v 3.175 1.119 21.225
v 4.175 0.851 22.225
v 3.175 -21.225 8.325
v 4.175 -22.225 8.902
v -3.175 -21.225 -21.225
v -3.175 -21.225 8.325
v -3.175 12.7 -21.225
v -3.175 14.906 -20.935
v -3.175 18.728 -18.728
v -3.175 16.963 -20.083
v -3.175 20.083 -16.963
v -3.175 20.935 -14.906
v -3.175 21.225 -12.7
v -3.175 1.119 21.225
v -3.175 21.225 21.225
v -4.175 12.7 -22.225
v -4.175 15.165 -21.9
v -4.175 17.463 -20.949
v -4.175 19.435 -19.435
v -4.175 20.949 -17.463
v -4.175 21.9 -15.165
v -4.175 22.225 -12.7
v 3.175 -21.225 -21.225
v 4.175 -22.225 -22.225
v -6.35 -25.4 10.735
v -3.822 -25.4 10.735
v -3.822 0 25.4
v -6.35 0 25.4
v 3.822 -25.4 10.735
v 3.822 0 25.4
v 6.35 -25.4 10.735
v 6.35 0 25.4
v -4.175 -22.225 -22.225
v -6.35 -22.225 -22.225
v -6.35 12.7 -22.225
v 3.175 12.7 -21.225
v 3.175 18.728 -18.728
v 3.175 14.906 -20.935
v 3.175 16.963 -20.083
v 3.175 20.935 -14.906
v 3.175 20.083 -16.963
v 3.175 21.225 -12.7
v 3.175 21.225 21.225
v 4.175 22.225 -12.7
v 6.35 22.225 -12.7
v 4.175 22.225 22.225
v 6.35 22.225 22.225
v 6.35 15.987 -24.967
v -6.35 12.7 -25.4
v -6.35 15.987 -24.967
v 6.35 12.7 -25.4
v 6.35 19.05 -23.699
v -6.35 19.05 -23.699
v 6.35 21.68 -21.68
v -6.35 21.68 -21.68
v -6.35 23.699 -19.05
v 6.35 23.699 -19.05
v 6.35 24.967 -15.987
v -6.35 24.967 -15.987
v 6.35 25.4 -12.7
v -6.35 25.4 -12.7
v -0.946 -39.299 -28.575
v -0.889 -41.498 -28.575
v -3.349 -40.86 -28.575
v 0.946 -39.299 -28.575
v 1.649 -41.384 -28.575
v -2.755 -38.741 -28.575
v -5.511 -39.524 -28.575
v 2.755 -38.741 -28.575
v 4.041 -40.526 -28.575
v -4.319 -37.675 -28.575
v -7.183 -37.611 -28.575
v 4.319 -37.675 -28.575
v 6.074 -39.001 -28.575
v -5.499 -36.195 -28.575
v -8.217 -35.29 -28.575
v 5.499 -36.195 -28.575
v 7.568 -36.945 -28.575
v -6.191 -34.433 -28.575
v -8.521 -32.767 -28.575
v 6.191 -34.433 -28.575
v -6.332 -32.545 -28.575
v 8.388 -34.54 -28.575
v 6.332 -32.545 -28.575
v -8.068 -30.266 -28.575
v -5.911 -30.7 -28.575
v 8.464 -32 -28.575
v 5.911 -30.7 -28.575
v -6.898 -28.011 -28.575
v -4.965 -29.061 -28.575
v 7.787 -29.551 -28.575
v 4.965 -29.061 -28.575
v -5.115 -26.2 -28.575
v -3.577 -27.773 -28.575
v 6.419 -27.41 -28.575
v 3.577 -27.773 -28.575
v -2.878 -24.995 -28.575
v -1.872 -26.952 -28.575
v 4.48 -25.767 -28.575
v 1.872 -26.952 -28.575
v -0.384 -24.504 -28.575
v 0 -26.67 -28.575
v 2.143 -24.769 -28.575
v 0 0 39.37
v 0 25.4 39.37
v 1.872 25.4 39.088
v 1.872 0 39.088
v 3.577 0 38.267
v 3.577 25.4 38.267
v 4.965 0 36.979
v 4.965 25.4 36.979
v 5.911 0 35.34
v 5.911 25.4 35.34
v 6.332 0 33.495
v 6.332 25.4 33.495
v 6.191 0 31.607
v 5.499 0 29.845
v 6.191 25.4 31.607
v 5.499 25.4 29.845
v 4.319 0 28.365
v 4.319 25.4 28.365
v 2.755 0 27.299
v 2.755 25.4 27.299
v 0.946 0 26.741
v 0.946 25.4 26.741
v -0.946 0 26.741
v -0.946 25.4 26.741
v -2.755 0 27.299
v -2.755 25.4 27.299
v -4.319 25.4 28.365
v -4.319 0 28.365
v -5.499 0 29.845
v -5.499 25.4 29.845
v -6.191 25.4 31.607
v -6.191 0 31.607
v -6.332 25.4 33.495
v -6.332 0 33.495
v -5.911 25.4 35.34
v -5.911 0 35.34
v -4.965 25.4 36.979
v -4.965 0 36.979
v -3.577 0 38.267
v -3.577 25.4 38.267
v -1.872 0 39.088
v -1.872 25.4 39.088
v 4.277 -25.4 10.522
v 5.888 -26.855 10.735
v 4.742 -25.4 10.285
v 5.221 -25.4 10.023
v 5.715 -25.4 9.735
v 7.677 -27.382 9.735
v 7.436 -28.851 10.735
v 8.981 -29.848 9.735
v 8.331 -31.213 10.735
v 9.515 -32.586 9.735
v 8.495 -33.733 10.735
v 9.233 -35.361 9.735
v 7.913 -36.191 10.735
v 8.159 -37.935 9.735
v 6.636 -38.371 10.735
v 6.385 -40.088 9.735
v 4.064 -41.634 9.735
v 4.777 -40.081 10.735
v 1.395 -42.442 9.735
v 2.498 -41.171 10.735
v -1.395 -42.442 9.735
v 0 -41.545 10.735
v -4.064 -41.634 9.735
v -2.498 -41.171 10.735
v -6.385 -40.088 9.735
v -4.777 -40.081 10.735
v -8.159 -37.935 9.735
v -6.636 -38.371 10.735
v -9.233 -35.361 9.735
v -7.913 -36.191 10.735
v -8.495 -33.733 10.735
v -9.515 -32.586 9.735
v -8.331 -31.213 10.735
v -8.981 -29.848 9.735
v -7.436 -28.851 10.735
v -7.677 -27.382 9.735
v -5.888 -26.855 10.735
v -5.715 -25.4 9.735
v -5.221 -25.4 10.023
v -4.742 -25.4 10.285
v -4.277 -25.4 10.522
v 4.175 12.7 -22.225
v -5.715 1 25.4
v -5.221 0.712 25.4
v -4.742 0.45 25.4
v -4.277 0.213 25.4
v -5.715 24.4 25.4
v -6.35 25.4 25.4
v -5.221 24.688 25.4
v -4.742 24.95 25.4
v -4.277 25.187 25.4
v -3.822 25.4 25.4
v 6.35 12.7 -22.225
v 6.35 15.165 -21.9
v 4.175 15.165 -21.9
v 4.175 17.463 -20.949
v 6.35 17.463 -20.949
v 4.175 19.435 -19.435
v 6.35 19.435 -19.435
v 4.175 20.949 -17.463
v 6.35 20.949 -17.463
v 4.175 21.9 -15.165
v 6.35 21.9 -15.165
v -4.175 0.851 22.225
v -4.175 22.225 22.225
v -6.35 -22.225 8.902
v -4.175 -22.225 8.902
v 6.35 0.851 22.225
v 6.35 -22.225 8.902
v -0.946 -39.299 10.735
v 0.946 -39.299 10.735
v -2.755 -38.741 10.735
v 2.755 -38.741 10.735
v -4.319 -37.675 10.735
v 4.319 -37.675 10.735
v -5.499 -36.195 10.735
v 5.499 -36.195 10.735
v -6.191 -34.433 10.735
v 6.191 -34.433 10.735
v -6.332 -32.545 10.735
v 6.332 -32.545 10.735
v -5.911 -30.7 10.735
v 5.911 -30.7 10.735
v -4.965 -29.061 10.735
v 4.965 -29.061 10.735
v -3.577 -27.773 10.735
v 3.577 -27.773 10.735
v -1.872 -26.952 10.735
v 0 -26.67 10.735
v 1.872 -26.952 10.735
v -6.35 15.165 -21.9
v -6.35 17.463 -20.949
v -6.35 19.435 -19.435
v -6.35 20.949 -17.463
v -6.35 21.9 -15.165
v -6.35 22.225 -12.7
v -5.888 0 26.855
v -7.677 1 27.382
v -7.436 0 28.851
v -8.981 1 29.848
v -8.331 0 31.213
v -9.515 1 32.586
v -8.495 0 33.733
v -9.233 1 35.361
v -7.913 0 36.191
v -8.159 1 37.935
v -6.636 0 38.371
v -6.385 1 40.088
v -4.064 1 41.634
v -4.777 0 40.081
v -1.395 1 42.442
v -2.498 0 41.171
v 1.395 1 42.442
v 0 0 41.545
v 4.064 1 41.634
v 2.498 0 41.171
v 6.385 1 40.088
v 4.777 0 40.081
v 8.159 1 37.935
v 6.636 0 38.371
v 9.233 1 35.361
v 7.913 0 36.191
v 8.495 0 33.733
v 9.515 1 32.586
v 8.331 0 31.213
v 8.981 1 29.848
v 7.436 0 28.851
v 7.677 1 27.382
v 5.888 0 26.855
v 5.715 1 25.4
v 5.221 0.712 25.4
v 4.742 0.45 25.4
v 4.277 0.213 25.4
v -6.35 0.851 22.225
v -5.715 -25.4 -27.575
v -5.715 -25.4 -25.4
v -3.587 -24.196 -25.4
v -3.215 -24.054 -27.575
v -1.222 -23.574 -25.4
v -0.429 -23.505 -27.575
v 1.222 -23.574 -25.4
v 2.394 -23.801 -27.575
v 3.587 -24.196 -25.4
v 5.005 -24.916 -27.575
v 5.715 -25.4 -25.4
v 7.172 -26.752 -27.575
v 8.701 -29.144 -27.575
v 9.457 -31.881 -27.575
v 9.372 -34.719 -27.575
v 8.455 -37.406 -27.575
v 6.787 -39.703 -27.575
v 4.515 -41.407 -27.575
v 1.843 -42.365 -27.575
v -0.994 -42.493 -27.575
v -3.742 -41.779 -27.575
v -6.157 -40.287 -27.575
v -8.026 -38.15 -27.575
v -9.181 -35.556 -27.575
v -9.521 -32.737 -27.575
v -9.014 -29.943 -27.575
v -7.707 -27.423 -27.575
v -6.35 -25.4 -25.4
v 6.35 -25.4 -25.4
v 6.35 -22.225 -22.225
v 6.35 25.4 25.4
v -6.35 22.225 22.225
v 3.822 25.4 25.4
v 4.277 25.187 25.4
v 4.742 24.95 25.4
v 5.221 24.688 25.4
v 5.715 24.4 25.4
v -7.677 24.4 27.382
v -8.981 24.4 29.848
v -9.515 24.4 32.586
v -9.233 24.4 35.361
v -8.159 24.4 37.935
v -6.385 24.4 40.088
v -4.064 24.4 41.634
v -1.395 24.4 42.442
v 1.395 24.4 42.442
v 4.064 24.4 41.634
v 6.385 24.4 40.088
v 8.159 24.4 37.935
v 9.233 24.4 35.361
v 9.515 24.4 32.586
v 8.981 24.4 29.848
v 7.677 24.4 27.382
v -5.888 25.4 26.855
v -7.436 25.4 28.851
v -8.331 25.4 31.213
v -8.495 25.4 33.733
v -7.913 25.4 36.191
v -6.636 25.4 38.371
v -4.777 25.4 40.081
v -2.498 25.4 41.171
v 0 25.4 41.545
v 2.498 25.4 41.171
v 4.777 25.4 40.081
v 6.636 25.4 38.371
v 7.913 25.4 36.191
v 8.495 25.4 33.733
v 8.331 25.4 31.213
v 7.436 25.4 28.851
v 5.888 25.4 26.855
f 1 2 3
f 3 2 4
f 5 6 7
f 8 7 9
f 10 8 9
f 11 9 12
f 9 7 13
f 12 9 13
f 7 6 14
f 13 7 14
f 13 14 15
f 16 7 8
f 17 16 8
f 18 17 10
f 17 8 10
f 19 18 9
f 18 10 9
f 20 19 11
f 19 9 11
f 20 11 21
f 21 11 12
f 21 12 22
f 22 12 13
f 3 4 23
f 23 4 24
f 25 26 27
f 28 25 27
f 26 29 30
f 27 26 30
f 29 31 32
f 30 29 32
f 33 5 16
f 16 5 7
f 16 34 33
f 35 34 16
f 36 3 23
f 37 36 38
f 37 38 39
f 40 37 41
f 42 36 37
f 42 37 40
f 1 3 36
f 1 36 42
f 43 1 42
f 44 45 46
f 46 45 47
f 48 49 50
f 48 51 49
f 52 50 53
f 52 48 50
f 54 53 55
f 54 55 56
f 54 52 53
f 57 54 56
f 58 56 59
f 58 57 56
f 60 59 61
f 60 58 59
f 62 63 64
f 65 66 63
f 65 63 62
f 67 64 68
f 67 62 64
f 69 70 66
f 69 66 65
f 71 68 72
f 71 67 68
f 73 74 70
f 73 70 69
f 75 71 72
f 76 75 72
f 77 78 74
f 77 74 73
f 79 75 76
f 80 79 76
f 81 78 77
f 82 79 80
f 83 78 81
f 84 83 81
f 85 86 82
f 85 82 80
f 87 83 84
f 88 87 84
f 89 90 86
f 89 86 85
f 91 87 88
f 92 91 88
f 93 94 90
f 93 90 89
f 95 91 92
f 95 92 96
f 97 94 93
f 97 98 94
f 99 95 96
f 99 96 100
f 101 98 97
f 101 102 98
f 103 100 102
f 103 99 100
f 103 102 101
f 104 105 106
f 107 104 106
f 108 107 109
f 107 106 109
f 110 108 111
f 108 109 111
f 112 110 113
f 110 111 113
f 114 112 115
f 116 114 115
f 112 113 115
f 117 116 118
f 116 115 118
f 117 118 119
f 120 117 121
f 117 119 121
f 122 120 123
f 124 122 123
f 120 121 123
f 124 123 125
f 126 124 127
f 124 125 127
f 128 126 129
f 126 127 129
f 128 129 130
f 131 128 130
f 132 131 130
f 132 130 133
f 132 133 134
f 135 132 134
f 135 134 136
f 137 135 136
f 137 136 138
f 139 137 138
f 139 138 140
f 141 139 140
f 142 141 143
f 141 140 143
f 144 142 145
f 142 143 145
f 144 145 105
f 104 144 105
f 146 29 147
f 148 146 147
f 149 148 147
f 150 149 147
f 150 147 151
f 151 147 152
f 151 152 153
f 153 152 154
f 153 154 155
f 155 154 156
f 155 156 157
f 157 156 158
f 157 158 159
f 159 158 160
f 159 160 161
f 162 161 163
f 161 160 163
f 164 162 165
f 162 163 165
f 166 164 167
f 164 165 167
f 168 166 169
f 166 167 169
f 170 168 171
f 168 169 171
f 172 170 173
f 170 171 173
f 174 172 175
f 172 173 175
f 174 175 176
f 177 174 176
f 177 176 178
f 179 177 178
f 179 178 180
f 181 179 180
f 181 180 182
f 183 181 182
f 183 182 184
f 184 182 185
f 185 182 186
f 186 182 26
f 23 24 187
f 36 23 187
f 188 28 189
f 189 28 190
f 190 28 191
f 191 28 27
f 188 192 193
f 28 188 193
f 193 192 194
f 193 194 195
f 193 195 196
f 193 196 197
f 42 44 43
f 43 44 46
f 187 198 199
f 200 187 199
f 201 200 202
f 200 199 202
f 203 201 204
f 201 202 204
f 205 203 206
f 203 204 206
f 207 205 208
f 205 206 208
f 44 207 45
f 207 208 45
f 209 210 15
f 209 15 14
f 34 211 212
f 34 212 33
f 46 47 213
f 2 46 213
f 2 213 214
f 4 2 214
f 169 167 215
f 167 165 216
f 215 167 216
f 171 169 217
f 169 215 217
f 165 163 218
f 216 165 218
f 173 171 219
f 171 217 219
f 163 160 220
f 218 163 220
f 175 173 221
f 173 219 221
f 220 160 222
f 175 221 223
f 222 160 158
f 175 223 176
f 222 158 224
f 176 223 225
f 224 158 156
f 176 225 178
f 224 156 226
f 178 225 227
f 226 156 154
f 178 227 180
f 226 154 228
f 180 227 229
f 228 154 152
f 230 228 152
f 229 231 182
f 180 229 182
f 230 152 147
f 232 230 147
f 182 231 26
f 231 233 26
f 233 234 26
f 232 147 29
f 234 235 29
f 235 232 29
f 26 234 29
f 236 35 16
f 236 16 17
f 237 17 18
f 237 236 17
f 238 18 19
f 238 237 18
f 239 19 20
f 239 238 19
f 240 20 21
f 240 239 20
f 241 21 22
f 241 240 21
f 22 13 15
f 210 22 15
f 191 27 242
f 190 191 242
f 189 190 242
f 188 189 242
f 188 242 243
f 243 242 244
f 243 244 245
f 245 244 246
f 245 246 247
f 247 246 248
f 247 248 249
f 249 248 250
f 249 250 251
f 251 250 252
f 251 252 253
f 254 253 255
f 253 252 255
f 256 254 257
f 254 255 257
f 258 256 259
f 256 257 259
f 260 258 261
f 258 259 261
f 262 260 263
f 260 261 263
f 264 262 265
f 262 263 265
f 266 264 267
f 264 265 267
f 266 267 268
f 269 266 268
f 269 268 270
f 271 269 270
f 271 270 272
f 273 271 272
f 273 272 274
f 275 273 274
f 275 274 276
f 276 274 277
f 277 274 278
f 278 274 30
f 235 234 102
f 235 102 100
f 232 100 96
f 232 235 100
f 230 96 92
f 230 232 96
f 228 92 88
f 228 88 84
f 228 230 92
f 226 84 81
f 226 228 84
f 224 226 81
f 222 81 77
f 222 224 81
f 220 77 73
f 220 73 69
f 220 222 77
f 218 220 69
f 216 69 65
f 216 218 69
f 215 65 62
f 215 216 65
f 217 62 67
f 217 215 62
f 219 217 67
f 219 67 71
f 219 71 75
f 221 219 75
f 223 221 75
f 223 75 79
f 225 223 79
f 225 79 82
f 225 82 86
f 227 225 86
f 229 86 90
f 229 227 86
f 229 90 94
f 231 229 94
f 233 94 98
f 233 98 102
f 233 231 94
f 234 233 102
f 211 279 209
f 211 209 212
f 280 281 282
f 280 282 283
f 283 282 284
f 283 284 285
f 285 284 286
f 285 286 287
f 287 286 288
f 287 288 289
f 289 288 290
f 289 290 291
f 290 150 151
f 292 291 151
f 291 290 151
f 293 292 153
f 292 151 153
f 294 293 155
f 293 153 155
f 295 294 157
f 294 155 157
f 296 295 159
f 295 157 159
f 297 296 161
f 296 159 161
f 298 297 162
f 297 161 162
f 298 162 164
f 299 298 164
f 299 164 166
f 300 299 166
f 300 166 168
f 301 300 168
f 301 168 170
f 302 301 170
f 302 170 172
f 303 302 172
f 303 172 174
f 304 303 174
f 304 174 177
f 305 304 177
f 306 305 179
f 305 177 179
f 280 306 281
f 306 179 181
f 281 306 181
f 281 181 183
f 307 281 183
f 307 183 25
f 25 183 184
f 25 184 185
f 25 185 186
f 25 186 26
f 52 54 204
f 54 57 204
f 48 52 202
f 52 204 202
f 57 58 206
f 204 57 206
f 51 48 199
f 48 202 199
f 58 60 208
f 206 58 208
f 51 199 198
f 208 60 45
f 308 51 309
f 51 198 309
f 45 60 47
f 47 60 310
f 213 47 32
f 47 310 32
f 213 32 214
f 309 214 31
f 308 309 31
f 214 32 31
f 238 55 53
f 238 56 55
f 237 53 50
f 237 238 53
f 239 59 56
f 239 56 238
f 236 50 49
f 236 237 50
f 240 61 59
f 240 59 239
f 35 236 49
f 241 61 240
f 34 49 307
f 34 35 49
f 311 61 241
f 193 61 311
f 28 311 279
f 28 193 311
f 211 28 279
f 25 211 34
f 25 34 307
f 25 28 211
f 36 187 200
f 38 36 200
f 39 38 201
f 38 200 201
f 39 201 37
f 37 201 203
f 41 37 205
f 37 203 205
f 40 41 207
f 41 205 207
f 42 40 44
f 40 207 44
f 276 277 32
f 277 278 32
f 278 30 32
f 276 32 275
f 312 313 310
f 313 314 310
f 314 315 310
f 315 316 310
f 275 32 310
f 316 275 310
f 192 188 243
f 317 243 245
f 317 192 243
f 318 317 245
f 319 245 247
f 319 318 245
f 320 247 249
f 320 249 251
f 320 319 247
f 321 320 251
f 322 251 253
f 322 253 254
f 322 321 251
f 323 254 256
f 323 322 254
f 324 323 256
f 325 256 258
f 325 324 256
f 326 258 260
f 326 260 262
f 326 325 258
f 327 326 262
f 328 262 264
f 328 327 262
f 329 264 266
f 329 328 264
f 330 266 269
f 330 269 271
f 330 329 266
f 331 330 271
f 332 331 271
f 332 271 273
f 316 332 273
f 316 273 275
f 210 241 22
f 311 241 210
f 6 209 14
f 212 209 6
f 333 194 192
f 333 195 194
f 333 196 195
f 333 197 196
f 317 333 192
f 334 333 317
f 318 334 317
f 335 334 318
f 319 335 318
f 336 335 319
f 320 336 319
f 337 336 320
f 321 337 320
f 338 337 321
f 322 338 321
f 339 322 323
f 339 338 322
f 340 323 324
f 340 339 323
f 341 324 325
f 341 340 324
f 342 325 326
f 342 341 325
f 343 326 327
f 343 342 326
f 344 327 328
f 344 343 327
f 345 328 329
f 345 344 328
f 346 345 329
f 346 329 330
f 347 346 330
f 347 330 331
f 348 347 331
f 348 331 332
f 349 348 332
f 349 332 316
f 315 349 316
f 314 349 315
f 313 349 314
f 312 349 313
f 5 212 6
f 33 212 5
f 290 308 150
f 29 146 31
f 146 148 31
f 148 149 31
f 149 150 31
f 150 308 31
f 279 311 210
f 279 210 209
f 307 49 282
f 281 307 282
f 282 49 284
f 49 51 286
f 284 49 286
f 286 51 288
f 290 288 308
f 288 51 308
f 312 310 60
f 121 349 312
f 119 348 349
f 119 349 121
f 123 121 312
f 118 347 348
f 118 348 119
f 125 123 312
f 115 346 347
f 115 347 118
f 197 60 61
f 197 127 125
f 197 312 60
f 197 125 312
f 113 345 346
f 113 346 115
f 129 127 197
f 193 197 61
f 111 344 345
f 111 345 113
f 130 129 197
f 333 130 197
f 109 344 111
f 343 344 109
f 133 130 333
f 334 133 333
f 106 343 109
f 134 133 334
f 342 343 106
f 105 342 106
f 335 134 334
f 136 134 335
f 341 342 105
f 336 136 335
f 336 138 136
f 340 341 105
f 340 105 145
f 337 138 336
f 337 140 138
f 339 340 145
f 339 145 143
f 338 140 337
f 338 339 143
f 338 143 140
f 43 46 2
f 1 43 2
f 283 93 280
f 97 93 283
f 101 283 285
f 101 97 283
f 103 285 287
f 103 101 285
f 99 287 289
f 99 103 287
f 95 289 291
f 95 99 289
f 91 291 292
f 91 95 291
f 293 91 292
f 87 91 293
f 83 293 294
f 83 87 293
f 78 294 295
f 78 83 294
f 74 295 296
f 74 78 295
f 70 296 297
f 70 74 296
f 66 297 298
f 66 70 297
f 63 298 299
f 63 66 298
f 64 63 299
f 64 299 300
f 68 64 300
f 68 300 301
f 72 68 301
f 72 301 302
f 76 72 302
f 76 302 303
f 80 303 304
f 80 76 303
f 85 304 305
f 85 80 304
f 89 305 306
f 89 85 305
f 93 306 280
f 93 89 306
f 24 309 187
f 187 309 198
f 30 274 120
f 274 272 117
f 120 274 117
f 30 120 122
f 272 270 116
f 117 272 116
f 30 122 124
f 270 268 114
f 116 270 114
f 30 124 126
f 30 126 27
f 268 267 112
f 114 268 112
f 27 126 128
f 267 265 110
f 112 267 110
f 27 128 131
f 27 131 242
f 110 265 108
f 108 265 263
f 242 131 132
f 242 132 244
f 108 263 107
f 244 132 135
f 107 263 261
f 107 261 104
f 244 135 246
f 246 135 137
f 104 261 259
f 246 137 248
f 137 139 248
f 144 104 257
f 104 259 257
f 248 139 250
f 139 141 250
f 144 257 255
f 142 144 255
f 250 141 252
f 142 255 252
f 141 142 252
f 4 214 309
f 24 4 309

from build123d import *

# Parameters (mm, degrees)
BOSS_EXTRUDE1_DEPTH      = 6.35
FILLET1_R                = 12.7
CUT_EXTRUDE2_DEPTH       = 3.175
BOSS_EXTRUDE2_DEPTH      = 3.175
BOSS_EXTRUDE2_DEPTH_BACK = 36.135303
SKETCH4_R                = 9.525
SKETCH4_R_2              = 6.35
SKETCH5_R                = 9.525
SKETCH5_R_2              = 6.35
BOSS_EXTRUDE3_DEPTH      = 25.4
CHAMFER2_SIZE            = 1
CHAMFER4_SIZE            = 1


with BuildPart() as part:
    # Sketch1 → Boss-Extrude1 (new, symmetric)
    with BuildSketch(Plane.YZ):
        Polygon((-25.4, 10.735303163), (0, 25.4), (25.4, 25.4), (25.4, -25.4), (-25.4, -25.4), align=None)
    extrude(amount=BOSS_EXTRUDE1_DEPTH, both=True)

    # Fillet1
    fillet1_edges = [part.edges().sort_by_distance(p)[0] for p in [
        (0, 25.4, -25.4),
    ]]
    fillet(fillet1_edges, radius=FILLET1_R)

    # Sketch3 → Cut-Extrude2 (cut)
    with BuildSketch(Plane.YZ.offset(6.35)):
        with BuildLine():
            Line((-22.225, -22.225), (12.7, -22.225))
            ThreePointArc((12.7, -22.225), (19.435192091, -19.435192091), (22.225, -12.7))
            Line((22.225, -12.7), (22.225, 22.225))
            Line((22.225, 22.225), (0.850738686, 22.225))
            Line((0.850738686, 22.225), (-22.225, 8.902216058))
            Line((-22.225, 8.902216058), (-22.225, -22.225))
        make_face()
    cut_extrude2 = extrude(amount=-CUT_EXTRUDE2_DEPTH, mode=Mode.SUBTRACT)

    # Mirror1: Cut-Extrude2 across plane
    add(cut_extrude2.mirror(Plane(origin=(0, 0, 0), x_dir=(0, 0, 1), z_dir=(1, 0, 0))), mode=Mode.SUBTRACT)

    # Sketch4 → Boss-Extrude2 (add, two sides: drawn at the far end of the back side and taken through both)
    with BuildSketch(Plane(origin=(0, 0, -25.4), x_dir=(1, 0, 0), z_dir=(0, 0, -1)).offset(-BOSS_EXTRUDE2_DEPTH_BACK)):
        with Locations(Location((0, 33.02, 0), (0, 0, 233.130102354))):
            Circle(SKETCH4_R)
        with Locations(Location((0, 33.02, 0), (0, 0, 270))):
            Circle(SKETCH4_R_2, mode=Mode.SUBTRACT)
    extrude(amount=BOSS_EXTRUDE2_DEPTH + BOSS_EXTRUDE2_DEPTH_BACK)

    # Sketch5 → Boss-Extrude3 (add)
    with BuildSketch(Plane(origin=(0, 25.4, 0), x_dir=(-1, 0, 0), z_dir=(0, 1, 0))):
        with Locations((0, 33.02)):
            Circle(SKETCH5_R)
        with Locations(Location((0, 33.02, 0), (0, 0, 90))):
            Circle(SKETCH5_R_2, mode=Mode.SUBTRACT)
    extrude(amount=-BOSS_EXTRUDE3_DEPTH)

    # Chamfer2
    # the kernel refuses this chamfer: 1 mm, written as the material it takes off along each edge
    with BuildSketch(Plane(origin=(0, -33.02, 10.735303), x_dir=(0.3638595085405839, 0.931453841070294, 0), z_dir=(-0.931453841070294, 0.3638595085405839, 0))) as chamfer2_piece_1_section:
        Polygon((9.525, CHAMFER2_SIZE), (9.525 - CHAMFER2_SIZE, 0), (9.525, 0), align=None)
    chamfer2_piece_1 = revolve(axis=Axis((0, -33.02, 10.735303), (0, 0, -1)), revolution_arc=317.325176487, mode=Mode.PRIVATE)
    chamfer2_piece_1 = split(chamfer2_piece_1, bisect_by=Plane(origin=(5.777045626, -25.4, 10.24862198), z_dir=(0, -1, 0)), keep=Keep.TOP, mode=Mode.PRIVATE)
    add(chamfer2_piece_1, mode=Mode.SUBTRACT)
    with BuildSketch(Plane(origin=(0, -33.02, -28.575), x_dir=(-0.6000000000021781, 0.7999999999983665, 0), z_dir=(-0.7999999999983665, -0.6000000000021781, 0))) as chamfer2_piece_2:
        Polygon((9.525, -CHAMFER2_SIZE), (9.525 - CHAMFER2_SIZE, 0), (9.525, 0), align=None)
    revolve(axis=Axis((0, -33.02, -28.575), (0, 0, -1)), mode=Mode.SUBTRACT)
    with BuildSketch(Plane(origin=(0, 25.4, 33.02), x_dir=(-0.3638595085405501, 0, -0.9314538410703074), z_dir=(0.9314538410703074, 0, -0.3638595085405501))) as chamfer2_piece_3_section:
        Polygon((9.525, -CHAMFER2_SIZE), (9.525 - CHAMFER2_SIZE, 0), (9.525, 0), align=None)
    chamfer2_piece_3 = revolve(axis=Axis((0, 25.4, 33.02), (0, 1, 0)), revolution_arc=317.325176487, mode=Mode.PRIVATE)
    chamfer2_piece_3 = split(chamfer2_piece_3, bisect_by=Plane(origin=(0, 24.920234358, 25.4), z_dir=(0, 0, 1)), keep=Keep.TOP, mode=Mode.PRIVATE)
    add(chamfer2_piece_3, mode=Mode.SUBTRACT)
    with BuildSketch(Plane(origin=(0, 0, 33.02), x_dir=(-0.3638595085405531, 0, -0.9314538410703063), z_dir=(0.9314538410703063, 0, -0.3638595085405531))) as chamfer2_piece_4_section:
        Polygon((9.525, CHAMFER2_SIZE), (9.525 - CHAMFER2_SIZE, 0), (9.525, 0), align=None)
    chamfer2_piece_4 = revolve(axis=Axis((0, 0, 33.02), (0, 1, 0)), revolution_arc=317.325176487, mode=Mode.PRIVATE)
    chamfer2_piece_4 = split(chamfer2_piece_4, bisect_by=Plane(origin=(-5.452412952, 0.490850729, 25.4), z_dir=(0, 0, 1)), keep=Keep.TOP, mode=Mode.PRIVATE)
    add(chamfer2_piece_4, mode=Mode.SUBTRACT)

    # Chamfer4
    chamfer4_edges = [part.edges().sort_by_distance(p)[0] for p in [
        (3.175, -22.225, -6.661391971),
        (3.175, -10.687130657, 15.563608029),
        (3.175, 11.537869343, 22.225),
        (3.175, 22.225, 4.7625),
        (3.175, 19.435192091, -19.435192091),
        (3.175, -4.7625, -22.225),
        (-3.175, -22.225, -6.661391971),
        (-3.175, -4.7625, -22.225),
        (-3.175, 19.435192091, -19.435192091),
        (-3.175, 22.225, 4.7625),
        (-3.175, 11.537869343, 22.225),
        (-3.175, -10.687130657, 15.563608029),
    ]]
    chamfer(chamfer4_edges, length=CHAMFER4_SIZE)


solid = part.part
